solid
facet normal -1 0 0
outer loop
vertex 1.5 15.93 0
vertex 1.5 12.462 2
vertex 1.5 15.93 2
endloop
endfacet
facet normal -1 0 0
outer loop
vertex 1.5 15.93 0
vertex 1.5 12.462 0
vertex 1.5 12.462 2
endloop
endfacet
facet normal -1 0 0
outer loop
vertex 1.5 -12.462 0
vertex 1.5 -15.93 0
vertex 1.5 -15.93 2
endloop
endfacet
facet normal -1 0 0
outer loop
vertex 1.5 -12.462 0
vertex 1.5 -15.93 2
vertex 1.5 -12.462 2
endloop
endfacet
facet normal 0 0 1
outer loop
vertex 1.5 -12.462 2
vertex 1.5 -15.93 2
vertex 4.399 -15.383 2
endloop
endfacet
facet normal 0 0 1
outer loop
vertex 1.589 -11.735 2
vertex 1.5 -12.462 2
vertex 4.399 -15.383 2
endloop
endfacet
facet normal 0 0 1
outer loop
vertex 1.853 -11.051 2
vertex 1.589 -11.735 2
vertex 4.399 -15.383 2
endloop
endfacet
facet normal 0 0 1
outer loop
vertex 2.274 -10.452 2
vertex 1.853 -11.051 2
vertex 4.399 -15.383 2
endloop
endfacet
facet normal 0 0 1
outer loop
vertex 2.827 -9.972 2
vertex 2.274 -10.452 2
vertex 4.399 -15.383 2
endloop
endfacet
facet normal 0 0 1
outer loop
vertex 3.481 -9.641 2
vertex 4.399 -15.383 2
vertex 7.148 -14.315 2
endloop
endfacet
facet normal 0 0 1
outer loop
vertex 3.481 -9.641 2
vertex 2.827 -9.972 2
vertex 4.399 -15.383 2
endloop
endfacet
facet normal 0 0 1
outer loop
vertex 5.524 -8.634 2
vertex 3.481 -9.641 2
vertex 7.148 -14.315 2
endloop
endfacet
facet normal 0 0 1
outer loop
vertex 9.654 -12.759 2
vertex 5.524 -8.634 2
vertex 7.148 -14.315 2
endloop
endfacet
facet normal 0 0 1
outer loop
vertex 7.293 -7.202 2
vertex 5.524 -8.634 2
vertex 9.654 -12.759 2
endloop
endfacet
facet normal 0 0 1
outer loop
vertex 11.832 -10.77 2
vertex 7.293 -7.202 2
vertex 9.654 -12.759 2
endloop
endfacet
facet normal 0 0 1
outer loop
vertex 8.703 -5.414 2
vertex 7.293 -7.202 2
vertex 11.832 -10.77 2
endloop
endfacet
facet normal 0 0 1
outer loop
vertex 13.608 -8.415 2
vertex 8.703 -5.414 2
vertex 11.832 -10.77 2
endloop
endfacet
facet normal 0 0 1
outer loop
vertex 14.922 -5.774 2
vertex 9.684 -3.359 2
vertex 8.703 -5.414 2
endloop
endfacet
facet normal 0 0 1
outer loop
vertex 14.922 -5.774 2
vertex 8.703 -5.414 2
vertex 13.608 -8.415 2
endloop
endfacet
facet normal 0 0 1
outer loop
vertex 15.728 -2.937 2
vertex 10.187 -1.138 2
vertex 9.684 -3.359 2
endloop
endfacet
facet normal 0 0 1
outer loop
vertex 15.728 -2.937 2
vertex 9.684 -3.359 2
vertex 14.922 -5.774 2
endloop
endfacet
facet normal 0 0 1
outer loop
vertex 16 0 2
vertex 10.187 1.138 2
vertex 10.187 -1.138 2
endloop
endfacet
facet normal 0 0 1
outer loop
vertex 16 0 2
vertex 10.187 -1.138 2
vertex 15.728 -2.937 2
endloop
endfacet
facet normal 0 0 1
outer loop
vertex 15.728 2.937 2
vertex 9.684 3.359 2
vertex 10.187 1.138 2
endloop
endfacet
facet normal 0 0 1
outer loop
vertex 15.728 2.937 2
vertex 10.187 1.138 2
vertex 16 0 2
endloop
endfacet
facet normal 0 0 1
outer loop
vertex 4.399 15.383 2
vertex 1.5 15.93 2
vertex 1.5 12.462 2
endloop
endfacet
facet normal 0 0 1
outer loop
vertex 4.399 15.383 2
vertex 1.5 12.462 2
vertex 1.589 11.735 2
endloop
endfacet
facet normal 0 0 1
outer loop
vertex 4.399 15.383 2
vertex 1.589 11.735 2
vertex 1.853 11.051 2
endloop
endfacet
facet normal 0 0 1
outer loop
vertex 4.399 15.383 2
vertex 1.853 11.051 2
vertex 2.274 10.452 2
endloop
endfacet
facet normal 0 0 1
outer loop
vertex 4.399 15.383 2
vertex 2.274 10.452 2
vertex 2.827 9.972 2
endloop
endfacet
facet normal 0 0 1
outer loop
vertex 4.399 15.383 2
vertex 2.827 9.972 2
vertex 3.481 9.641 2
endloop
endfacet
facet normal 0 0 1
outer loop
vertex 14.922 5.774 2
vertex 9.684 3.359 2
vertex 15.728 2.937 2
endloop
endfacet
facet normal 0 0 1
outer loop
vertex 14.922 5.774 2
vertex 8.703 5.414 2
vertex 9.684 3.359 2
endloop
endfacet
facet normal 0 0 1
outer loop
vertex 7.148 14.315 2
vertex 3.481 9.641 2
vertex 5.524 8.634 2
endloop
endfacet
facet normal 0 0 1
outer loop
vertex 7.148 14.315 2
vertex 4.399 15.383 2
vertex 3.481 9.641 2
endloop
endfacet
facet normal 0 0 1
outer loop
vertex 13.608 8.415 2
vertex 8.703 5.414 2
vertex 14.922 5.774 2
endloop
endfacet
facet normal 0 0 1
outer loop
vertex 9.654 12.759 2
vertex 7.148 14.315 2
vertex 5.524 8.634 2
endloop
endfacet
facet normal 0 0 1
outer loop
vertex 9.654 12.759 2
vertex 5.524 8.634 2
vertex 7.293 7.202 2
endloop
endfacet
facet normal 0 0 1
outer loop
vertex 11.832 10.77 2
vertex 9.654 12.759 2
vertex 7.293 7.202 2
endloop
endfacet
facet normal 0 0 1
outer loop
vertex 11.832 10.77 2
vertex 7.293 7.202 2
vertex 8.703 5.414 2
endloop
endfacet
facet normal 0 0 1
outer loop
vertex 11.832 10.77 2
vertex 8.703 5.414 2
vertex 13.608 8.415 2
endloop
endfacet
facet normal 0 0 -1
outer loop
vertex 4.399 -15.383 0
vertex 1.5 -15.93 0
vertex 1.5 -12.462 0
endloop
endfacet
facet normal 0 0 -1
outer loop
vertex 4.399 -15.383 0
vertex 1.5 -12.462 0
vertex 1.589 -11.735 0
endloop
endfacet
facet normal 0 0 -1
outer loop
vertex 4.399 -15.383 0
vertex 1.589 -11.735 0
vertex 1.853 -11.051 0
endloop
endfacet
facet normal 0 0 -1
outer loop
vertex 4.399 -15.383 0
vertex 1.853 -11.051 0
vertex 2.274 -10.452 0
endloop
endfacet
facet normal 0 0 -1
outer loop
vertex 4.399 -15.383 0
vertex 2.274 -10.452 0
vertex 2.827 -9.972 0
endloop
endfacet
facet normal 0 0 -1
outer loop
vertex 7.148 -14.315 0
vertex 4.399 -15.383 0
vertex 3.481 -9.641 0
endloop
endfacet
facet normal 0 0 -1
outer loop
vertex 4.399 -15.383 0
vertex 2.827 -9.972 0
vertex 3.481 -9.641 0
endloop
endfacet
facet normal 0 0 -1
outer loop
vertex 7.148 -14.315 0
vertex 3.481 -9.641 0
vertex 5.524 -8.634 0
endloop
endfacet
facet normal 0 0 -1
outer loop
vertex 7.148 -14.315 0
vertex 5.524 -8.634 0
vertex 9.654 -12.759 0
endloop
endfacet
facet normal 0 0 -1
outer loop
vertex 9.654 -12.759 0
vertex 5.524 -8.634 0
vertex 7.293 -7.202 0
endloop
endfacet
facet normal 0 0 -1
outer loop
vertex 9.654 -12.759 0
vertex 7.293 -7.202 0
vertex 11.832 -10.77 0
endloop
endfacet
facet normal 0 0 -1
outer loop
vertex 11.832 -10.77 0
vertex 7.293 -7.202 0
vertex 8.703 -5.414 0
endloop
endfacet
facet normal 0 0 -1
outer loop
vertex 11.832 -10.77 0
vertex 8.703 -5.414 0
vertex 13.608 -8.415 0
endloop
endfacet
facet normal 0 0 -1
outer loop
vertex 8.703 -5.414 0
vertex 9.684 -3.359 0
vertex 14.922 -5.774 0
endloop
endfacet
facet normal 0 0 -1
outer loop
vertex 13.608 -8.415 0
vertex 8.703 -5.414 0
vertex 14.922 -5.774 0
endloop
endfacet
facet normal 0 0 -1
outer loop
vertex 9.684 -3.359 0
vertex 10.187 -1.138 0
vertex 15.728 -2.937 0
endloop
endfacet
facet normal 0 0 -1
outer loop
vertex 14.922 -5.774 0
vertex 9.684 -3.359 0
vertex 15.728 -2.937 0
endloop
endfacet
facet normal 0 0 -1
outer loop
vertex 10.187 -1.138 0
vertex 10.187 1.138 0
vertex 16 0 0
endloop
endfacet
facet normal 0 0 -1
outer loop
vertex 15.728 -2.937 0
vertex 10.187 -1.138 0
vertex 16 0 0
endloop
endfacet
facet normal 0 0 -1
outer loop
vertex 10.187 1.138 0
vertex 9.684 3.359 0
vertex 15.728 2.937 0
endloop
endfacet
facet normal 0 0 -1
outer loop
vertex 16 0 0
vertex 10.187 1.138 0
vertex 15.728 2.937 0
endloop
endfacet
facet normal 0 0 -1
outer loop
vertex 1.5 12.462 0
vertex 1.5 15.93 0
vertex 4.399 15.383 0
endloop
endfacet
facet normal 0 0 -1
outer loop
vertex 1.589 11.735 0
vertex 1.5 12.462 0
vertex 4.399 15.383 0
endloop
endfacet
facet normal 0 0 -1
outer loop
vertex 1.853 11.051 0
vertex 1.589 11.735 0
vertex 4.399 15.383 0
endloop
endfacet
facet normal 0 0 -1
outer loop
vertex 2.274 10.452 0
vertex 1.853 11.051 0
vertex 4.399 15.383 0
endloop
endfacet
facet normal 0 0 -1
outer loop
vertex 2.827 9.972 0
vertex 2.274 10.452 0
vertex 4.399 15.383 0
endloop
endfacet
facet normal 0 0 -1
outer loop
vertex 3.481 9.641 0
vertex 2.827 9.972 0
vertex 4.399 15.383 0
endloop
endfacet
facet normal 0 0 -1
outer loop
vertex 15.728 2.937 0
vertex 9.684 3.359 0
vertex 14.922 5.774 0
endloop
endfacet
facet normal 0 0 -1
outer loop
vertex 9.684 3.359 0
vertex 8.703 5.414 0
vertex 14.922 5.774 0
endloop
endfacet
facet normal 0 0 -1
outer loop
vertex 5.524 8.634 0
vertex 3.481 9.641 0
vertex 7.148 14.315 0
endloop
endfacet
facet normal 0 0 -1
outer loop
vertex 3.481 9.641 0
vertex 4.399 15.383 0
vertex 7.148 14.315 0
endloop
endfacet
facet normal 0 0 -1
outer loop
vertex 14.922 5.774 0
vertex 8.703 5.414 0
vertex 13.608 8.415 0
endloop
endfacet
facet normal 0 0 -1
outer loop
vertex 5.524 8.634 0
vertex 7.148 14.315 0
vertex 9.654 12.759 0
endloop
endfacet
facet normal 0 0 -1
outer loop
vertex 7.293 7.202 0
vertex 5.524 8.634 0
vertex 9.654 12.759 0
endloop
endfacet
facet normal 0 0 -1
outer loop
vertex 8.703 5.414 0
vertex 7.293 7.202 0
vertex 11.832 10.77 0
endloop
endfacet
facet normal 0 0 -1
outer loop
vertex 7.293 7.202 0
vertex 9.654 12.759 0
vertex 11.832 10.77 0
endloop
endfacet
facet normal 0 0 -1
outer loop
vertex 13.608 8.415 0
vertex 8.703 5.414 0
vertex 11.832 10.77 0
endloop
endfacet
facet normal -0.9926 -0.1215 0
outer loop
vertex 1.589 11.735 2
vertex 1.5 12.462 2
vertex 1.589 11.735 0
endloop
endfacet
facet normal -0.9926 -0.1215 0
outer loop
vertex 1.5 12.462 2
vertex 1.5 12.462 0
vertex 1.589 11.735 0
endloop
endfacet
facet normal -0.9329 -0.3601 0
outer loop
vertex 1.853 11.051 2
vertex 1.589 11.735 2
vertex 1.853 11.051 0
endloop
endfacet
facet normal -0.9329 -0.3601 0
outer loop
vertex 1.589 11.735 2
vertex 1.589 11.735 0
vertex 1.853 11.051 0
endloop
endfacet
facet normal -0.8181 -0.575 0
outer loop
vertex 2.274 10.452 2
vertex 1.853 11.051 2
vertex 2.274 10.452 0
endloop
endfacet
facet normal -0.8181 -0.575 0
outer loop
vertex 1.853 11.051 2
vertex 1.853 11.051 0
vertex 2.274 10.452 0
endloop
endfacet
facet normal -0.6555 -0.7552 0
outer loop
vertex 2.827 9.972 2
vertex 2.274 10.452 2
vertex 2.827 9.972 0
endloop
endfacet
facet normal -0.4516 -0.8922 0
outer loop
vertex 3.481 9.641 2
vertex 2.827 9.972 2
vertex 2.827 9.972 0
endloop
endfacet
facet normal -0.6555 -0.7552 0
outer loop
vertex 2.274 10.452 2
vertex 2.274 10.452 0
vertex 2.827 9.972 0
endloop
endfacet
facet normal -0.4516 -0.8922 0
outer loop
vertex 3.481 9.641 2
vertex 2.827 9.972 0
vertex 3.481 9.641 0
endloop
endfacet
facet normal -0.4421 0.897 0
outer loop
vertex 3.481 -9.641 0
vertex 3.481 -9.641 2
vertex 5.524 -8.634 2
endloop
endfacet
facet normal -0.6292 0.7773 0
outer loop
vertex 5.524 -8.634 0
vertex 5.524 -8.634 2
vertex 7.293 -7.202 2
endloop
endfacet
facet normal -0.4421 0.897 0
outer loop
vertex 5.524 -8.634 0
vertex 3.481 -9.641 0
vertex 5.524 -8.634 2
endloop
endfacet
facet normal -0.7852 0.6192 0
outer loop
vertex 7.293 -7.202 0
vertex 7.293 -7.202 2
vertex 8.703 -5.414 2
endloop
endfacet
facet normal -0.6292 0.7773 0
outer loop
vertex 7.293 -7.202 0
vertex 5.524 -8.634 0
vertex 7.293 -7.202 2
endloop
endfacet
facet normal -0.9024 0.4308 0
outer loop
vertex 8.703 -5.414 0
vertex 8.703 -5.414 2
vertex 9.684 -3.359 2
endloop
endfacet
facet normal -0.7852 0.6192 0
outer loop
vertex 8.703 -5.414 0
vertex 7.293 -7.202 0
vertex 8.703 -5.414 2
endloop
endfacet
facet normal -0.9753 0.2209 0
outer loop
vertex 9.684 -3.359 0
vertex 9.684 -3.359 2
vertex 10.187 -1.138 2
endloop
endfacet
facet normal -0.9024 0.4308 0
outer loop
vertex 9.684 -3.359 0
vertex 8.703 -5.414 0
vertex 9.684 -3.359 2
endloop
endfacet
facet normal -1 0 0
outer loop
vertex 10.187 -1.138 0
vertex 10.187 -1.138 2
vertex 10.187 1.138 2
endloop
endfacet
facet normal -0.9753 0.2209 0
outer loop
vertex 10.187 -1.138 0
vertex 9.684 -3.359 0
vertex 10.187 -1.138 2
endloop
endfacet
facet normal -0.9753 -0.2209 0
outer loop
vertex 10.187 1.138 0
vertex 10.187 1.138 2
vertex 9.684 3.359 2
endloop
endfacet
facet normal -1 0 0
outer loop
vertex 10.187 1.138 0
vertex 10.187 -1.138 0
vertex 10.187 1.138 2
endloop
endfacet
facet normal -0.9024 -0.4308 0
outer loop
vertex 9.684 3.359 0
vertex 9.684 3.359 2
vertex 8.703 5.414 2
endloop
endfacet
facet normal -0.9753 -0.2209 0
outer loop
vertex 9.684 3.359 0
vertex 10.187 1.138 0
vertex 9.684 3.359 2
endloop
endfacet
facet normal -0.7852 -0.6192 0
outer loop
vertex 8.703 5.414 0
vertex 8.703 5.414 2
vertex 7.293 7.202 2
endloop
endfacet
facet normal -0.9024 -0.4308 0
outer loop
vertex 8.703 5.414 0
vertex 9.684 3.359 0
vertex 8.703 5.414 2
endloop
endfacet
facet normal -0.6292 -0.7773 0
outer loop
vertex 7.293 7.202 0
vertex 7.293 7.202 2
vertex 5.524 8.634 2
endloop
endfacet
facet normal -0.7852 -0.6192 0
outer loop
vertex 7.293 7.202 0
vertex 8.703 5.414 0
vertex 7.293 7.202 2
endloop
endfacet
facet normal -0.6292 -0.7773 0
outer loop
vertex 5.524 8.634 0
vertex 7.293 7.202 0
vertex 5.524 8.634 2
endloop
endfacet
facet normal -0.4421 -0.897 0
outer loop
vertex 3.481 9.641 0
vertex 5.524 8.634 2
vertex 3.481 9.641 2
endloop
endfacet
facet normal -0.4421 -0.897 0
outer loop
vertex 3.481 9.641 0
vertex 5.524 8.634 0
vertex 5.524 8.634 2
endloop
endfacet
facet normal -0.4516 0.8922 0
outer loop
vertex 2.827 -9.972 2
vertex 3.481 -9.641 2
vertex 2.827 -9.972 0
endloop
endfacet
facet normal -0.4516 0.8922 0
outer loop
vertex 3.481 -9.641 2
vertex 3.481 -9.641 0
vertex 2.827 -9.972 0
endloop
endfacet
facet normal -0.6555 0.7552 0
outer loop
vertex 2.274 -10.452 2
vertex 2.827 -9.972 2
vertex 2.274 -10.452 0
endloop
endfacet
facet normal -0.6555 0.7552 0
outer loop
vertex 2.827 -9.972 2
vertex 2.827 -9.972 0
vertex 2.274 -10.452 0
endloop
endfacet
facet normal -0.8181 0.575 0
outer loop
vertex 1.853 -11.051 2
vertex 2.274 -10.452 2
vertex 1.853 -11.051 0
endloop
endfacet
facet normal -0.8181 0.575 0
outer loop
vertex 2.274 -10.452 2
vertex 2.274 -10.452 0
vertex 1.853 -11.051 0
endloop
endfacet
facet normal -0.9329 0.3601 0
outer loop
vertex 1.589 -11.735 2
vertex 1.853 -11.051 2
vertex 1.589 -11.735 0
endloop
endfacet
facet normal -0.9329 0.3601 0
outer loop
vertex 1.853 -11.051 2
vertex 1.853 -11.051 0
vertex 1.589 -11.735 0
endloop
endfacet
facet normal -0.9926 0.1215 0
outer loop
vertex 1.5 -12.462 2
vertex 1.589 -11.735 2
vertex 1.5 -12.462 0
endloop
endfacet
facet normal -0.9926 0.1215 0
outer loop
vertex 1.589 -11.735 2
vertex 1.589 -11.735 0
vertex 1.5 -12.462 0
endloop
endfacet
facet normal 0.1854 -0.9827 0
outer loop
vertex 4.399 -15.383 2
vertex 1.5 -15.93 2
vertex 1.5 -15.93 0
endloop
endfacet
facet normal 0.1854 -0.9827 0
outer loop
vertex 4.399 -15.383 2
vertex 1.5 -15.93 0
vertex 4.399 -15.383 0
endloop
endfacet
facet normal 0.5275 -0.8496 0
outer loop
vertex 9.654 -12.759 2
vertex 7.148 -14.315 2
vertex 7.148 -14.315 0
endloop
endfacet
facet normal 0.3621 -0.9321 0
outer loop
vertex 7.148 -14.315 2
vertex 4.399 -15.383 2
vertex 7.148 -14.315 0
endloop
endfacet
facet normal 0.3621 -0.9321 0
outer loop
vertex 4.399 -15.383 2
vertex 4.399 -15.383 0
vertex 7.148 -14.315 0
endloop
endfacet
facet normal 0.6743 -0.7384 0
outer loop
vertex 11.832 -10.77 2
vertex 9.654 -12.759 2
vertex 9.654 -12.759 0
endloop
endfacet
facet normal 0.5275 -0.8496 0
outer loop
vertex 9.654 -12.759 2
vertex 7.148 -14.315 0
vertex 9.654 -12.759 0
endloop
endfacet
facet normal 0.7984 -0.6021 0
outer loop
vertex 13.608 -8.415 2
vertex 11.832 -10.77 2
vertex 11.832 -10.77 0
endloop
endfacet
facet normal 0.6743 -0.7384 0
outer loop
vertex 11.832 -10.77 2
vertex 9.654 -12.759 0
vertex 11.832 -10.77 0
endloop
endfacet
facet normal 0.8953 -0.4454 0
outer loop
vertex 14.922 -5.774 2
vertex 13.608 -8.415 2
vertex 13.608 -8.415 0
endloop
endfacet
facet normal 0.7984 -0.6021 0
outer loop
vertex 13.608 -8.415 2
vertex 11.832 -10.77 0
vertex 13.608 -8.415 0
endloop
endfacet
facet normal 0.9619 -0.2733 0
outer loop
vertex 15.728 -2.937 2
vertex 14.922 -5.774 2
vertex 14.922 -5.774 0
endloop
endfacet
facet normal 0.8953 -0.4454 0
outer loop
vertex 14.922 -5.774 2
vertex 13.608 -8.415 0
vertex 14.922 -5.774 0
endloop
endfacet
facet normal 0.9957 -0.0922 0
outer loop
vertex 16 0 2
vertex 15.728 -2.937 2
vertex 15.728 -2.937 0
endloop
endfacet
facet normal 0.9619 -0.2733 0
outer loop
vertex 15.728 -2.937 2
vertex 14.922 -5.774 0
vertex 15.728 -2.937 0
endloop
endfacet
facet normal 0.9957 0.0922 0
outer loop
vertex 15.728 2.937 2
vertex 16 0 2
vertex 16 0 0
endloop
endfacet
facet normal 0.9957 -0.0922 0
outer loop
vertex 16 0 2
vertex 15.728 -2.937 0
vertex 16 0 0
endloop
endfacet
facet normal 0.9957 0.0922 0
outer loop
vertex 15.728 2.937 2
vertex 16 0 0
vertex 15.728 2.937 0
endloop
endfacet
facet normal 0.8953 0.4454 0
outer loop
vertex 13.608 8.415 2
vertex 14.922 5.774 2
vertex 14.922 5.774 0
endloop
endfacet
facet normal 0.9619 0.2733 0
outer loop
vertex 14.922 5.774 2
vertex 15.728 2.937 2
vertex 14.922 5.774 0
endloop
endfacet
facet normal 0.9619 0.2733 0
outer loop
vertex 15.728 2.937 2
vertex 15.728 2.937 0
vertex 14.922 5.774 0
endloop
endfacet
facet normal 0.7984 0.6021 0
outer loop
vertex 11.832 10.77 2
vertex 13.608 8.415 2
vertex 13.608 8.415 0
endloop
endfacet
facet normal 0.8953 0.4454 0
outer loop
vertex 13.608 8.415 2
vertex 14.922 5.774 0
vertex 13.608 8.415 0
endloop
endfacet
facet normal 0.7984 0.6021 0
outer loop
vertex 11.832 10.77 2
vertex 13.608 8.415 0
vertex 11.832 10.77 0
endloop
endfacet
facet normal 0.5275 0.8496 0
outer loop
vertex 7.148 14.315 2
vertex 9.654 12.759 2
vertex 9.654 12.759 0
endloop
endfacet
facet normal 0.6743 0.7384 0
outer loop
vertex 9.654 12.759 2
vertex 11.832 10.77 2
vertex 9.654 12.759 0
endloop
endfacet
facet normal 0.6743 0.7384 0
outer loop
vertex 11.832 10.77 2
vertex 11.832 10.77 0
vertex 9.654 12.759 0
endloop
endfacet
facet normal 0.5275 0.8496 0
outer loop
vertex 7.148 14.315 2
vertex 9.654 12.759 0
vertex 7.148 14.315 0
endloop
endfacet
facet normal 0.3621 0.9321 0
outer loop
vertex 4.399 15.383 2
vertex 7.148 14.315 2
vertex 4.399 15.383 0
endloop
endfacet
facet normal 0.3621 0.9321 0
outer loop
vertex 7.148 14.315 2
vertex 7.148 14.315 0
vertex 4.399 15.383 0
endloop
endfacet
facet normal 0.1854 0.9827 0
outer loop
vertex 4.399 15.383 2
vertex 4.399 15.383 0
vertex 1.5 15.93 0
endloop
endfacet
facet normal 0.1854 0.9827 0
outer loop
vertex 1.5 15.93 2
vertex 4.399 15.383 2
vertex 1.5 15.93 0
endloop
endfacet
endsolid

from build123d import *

# Parameters (mm, degrees)
SKETCH_1_R               = 16
SKETCH_1_R_2             = 10.25
EXTRUDE_1_DEPTH          = 2
CUT_EXTRUDE_1_DEPTH      = 23.715633383
CUT_EXTRUDE_1_DEPTH_BACK = 23.715633383
FILLET_1_R               = 3


with BuildPart() as part:
    # 草图1 → 凸台-拉伸1 (new body)
    with BuildSketch(Plane.XY):
        Circle(SKETCH_1_R)
        Circle(SKETCH_1_R_2, mode=Mode.SUBTRACT)
    extrude(amount=EXTRUDE_1_DEPTH)

    # 草图2 → 切除-拉伸1 (cut, two sides: drawn at the far end of the back side and taken through both)
    with BuildSketch(Plane.XY.offset(2).offset(-CUT_EXTRUDE_1_DEPTH_BACK)):
        Polygon((1.5, 125.288041533), (1.5, 21.206511883), (1.5, -27.664442689), (1.5, -131.74597234), (-206.663059302, -131.74597234), (-206.663059302, 125.288041533), align=None)
    extrude(amount=CUT_EXTRUDE_1_DEPTH + CUT_EXTRUDE_1_DEPTH_BACK, mode=Mode.SUBTRACT)

    # 圆角1
    fillet_1_edges = [part.edges().sort_by_distance(p)[0] for p in [
        (1.5, 10.139649895, 1),
        (1.5, -10.139649895, 1),
    ]]
    fillet(fillet_1_edges, radius=FILLET_1_R)


solid = part.part
